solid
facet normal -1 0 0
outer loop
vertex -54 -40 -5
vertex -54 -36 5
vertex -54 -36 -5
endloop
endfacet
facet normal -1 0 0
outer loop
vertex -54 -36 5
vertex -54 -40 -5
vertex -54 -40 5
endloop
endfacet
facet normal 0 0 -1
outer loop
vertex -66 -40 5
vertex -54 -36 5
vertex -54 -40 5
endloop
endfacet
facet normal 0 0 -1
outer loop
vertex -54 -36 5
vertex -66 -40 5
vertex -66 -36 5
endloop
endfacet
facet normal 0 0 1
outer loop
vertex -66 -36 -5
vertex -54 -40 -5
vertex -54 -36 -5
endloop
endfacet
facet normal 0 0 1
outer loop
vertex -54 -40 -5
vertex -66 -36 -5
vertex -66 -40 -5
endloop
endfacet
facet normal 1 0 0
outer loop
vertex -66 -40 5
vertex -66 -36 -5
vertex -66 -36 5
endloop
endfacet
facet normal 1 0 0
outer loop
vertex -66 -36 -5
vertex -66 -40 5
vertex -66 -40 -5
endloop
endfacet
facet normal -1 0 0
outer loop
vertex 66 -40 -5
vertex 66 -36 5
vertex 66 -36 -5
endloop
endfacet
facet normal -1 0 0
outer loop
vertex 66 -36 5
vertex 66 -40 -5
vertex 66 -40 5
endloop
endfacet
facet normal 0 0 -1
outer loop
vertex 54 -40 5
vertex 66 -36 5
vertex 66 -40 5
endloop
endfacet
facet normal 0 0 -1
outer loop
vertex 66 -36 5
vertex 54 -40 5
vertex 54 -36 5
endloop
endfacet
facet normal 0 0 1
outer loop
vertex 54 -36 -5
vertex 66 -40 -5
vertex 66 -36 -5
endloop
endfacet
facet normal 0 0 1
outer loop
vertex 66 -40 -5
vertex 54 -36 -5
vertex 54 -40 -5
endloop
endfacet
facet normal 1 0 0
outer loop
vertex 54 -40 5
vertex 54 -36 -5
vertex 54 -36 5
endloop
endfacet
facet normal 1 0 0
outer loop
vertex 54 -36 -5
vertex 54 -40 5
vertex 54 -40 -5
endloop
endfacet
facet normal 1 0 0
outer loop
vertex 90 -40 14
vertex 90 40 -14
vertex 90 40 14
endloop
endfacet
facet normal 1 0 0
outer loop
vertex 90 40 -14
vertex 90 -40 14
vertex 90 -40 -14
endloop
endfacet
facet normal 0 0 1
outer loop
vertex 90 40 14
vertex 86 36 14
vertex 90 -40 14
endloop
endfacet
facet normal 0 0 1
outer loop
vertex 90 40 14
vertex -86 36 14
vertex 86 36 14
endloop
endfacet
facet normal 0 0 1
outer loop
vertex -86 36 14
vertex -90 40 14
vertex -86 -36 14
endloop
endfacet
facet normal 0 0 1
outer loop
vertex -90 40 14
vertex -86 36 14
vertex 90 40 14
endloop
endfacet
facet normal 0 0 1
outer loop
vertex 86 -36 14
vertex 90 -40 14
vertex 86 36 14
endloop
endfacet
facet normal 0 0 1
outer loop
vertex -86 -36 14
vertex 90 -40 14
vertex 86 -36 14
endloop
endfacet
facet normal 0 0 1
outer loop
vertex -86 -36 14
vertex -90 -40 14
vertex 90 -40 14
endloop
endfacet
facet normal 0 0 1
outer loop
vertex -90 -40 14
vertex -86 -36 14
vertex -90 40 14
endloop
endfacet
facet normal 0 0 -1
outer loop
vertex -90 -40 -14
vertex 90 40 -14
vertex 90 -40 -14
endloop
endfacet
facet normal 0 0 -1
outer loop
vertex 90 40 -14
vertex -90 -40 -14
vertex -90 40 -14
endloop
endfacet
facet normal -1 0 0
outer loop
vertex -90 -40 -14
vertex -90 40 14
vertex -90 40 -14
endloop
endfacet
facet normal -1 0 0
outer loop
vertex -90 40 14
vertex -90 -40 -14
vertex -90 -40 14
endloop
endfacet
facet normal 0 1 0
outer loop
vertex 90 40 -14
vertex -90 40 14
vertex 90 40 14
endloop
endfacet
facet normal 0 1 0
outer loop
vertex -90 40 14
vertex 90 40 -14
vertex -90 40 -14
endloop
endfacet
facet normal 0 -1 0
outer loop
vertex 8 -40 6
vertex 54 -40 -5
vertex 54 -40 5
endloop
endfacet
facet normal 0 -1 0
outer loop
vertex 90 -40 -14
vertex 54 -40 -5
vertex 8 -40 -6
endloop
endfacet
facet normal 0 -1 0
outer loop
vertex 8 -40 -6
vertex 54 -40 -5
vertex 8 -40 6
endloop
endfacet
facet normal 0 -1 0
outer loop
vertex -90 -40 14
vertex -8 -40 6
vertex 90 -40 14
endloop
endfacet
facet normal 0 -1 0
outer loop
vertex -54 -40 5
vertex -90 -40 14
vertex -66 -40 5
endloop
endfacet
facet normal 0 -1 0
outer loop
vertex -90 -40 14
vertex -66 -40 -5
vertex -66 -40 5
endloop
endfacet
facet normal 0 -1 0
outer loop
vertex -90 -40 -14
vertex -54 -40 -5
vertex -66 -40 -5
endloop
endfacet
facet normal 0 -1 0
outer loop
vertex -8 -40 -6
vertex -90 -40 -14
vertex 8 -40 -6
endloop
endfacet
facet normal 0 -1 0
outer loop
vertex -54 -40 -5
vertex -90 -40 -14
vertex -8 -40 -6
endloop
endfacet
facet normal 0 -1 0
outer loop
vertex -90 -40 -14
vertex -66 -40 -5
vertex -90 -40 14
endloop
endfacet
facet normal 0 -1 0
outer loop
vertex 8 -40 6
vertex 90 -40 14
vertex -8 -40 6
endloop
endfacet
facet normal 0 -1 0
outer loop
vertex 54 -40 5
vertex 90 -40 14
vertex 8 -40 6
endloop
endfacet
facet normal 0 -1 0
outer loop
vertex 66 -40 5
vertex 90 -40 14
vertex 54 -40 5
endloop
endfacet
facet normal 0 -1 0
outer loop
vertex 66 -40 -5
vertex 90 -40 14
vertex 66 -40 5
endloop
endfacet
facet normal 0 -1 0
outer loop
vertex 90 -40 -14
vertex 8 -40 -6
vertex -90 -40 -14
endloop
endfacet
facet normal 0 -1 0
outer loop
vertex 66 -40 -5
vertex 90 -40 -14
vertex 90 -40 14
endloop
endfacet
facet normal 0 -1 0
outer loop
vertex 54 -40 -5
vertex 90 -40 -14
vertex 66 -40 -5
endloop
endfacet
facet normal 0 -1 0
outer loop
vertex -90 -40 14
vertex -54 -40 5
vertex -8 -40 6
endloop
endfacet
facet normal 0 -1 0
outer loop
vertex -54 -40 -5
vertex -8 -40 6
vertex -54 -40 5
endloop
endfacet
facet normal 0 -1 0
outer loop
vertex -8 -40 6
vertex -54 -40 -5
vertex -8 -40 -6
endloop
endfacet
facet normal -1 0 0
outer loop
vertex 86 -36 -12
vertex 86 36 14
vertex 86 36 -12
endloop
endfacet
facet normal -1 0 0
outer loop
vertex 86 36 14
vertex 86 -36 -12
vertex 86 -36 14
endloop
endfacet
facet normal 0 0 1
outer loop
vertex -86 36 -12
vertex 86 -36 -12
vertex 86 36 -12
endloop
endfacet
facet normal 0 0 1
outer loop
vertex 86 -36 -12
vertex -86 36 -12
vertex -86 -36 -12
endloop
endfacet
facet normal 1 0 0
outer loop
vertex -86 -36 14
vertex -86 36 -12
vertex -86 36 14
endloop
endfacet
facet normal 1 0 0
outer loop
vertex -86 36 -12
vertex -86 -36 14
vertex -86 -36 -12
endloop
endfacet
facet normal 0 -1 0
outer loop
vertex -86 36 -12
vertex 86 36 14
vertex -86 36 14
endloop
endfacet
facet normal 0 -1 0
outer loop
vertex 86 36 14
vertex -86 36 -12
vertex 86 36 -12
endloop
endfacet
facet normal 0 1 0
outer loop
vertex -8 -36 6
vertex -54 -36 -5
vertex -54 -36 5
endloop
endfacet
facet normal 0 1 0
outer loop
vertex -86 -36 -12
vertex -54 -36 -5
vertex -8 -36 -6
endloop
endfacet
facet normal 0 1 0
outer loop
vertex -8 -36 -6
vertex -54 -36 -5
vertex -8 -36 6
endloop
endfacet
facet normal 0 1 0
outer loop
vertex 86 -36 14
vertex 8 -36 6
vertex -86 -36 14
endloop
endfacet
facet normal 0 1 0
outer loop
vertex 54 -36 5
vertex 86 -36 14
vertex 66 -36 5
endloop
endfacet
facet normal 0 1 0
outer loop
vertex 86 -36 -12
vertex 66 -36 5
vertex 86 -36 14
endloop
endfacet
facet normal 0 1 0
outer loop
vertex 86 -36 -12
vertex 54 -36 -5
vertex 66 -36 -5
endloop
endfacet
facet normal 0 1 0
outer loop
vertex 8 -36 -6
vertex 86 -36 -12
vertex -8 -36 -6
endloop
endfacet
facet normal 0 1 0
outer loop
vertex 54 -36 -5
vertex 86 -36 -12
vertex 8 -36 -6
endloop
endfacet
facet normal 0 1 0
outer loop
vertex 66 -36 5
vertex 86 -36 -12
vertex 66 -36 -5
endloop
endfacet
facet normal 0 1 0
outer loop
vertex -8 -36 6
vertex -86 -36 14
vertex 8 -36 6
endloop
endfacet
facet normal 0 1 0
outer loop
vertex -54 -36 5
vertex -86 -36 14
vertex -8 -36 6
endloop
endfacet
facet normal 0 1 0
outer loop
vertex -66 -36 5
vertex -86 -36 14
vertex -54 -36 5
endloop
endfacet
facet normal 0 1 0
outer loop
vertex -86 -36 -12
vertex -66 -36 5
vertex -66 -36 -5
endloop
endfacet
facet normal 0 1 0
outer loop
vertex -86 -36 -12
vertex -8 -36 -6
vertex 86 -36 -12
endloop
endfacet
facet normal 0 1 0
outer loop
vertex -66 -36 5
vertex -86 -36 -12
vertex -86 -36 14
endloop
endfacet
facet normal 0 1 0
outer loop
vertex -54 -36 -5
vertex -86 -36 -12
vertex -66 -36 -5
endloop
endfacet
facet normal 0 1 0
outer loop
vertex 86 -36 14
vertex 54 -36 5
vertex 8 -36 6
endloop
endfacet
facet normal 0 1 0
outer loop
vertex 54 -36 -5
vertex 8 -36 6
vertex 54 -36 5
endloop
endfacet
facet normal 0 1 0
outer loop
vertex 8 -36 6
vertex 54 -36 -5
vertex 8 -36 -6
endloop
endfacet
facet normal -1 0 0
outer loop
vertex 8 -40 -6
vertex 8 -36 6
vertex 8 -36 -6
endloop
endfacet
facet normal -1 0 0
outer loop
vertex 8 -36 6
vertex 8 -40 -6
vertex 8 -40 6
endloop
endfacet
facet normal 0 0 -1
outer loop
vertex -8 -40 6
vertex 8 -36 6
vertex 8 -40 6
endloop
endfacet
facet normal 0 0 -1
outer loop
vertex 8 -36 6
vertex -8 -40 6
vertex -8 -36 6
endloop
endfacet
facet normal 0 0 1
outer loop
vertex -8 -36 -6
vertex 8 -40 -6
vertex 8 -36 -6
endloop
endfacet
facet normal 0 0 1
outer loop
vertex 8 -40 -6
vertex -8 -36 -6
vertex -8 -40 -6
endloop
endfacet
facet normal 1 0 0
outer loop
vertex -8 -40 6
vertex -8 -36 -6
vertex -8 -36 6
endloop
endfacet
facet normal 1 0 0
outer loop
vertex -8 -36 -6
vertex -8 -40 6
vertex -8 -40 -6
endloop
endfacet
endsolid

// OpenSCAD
// Stream E dock enclosure concept
module dock_shell() {
  difference() {
    cube([180, 80, 28], center=true);
    translate([0,0,2]) cube([172, 72, 28], center=true);
    for (x=[-60,60]) translate([x, -40, 0]) cube([12, 20, 10], center=true); // USB-C
    translate([0, -40, 0]) cube([16, 20, 12], center=true); // RJ45
  }
}
dock_shell();
